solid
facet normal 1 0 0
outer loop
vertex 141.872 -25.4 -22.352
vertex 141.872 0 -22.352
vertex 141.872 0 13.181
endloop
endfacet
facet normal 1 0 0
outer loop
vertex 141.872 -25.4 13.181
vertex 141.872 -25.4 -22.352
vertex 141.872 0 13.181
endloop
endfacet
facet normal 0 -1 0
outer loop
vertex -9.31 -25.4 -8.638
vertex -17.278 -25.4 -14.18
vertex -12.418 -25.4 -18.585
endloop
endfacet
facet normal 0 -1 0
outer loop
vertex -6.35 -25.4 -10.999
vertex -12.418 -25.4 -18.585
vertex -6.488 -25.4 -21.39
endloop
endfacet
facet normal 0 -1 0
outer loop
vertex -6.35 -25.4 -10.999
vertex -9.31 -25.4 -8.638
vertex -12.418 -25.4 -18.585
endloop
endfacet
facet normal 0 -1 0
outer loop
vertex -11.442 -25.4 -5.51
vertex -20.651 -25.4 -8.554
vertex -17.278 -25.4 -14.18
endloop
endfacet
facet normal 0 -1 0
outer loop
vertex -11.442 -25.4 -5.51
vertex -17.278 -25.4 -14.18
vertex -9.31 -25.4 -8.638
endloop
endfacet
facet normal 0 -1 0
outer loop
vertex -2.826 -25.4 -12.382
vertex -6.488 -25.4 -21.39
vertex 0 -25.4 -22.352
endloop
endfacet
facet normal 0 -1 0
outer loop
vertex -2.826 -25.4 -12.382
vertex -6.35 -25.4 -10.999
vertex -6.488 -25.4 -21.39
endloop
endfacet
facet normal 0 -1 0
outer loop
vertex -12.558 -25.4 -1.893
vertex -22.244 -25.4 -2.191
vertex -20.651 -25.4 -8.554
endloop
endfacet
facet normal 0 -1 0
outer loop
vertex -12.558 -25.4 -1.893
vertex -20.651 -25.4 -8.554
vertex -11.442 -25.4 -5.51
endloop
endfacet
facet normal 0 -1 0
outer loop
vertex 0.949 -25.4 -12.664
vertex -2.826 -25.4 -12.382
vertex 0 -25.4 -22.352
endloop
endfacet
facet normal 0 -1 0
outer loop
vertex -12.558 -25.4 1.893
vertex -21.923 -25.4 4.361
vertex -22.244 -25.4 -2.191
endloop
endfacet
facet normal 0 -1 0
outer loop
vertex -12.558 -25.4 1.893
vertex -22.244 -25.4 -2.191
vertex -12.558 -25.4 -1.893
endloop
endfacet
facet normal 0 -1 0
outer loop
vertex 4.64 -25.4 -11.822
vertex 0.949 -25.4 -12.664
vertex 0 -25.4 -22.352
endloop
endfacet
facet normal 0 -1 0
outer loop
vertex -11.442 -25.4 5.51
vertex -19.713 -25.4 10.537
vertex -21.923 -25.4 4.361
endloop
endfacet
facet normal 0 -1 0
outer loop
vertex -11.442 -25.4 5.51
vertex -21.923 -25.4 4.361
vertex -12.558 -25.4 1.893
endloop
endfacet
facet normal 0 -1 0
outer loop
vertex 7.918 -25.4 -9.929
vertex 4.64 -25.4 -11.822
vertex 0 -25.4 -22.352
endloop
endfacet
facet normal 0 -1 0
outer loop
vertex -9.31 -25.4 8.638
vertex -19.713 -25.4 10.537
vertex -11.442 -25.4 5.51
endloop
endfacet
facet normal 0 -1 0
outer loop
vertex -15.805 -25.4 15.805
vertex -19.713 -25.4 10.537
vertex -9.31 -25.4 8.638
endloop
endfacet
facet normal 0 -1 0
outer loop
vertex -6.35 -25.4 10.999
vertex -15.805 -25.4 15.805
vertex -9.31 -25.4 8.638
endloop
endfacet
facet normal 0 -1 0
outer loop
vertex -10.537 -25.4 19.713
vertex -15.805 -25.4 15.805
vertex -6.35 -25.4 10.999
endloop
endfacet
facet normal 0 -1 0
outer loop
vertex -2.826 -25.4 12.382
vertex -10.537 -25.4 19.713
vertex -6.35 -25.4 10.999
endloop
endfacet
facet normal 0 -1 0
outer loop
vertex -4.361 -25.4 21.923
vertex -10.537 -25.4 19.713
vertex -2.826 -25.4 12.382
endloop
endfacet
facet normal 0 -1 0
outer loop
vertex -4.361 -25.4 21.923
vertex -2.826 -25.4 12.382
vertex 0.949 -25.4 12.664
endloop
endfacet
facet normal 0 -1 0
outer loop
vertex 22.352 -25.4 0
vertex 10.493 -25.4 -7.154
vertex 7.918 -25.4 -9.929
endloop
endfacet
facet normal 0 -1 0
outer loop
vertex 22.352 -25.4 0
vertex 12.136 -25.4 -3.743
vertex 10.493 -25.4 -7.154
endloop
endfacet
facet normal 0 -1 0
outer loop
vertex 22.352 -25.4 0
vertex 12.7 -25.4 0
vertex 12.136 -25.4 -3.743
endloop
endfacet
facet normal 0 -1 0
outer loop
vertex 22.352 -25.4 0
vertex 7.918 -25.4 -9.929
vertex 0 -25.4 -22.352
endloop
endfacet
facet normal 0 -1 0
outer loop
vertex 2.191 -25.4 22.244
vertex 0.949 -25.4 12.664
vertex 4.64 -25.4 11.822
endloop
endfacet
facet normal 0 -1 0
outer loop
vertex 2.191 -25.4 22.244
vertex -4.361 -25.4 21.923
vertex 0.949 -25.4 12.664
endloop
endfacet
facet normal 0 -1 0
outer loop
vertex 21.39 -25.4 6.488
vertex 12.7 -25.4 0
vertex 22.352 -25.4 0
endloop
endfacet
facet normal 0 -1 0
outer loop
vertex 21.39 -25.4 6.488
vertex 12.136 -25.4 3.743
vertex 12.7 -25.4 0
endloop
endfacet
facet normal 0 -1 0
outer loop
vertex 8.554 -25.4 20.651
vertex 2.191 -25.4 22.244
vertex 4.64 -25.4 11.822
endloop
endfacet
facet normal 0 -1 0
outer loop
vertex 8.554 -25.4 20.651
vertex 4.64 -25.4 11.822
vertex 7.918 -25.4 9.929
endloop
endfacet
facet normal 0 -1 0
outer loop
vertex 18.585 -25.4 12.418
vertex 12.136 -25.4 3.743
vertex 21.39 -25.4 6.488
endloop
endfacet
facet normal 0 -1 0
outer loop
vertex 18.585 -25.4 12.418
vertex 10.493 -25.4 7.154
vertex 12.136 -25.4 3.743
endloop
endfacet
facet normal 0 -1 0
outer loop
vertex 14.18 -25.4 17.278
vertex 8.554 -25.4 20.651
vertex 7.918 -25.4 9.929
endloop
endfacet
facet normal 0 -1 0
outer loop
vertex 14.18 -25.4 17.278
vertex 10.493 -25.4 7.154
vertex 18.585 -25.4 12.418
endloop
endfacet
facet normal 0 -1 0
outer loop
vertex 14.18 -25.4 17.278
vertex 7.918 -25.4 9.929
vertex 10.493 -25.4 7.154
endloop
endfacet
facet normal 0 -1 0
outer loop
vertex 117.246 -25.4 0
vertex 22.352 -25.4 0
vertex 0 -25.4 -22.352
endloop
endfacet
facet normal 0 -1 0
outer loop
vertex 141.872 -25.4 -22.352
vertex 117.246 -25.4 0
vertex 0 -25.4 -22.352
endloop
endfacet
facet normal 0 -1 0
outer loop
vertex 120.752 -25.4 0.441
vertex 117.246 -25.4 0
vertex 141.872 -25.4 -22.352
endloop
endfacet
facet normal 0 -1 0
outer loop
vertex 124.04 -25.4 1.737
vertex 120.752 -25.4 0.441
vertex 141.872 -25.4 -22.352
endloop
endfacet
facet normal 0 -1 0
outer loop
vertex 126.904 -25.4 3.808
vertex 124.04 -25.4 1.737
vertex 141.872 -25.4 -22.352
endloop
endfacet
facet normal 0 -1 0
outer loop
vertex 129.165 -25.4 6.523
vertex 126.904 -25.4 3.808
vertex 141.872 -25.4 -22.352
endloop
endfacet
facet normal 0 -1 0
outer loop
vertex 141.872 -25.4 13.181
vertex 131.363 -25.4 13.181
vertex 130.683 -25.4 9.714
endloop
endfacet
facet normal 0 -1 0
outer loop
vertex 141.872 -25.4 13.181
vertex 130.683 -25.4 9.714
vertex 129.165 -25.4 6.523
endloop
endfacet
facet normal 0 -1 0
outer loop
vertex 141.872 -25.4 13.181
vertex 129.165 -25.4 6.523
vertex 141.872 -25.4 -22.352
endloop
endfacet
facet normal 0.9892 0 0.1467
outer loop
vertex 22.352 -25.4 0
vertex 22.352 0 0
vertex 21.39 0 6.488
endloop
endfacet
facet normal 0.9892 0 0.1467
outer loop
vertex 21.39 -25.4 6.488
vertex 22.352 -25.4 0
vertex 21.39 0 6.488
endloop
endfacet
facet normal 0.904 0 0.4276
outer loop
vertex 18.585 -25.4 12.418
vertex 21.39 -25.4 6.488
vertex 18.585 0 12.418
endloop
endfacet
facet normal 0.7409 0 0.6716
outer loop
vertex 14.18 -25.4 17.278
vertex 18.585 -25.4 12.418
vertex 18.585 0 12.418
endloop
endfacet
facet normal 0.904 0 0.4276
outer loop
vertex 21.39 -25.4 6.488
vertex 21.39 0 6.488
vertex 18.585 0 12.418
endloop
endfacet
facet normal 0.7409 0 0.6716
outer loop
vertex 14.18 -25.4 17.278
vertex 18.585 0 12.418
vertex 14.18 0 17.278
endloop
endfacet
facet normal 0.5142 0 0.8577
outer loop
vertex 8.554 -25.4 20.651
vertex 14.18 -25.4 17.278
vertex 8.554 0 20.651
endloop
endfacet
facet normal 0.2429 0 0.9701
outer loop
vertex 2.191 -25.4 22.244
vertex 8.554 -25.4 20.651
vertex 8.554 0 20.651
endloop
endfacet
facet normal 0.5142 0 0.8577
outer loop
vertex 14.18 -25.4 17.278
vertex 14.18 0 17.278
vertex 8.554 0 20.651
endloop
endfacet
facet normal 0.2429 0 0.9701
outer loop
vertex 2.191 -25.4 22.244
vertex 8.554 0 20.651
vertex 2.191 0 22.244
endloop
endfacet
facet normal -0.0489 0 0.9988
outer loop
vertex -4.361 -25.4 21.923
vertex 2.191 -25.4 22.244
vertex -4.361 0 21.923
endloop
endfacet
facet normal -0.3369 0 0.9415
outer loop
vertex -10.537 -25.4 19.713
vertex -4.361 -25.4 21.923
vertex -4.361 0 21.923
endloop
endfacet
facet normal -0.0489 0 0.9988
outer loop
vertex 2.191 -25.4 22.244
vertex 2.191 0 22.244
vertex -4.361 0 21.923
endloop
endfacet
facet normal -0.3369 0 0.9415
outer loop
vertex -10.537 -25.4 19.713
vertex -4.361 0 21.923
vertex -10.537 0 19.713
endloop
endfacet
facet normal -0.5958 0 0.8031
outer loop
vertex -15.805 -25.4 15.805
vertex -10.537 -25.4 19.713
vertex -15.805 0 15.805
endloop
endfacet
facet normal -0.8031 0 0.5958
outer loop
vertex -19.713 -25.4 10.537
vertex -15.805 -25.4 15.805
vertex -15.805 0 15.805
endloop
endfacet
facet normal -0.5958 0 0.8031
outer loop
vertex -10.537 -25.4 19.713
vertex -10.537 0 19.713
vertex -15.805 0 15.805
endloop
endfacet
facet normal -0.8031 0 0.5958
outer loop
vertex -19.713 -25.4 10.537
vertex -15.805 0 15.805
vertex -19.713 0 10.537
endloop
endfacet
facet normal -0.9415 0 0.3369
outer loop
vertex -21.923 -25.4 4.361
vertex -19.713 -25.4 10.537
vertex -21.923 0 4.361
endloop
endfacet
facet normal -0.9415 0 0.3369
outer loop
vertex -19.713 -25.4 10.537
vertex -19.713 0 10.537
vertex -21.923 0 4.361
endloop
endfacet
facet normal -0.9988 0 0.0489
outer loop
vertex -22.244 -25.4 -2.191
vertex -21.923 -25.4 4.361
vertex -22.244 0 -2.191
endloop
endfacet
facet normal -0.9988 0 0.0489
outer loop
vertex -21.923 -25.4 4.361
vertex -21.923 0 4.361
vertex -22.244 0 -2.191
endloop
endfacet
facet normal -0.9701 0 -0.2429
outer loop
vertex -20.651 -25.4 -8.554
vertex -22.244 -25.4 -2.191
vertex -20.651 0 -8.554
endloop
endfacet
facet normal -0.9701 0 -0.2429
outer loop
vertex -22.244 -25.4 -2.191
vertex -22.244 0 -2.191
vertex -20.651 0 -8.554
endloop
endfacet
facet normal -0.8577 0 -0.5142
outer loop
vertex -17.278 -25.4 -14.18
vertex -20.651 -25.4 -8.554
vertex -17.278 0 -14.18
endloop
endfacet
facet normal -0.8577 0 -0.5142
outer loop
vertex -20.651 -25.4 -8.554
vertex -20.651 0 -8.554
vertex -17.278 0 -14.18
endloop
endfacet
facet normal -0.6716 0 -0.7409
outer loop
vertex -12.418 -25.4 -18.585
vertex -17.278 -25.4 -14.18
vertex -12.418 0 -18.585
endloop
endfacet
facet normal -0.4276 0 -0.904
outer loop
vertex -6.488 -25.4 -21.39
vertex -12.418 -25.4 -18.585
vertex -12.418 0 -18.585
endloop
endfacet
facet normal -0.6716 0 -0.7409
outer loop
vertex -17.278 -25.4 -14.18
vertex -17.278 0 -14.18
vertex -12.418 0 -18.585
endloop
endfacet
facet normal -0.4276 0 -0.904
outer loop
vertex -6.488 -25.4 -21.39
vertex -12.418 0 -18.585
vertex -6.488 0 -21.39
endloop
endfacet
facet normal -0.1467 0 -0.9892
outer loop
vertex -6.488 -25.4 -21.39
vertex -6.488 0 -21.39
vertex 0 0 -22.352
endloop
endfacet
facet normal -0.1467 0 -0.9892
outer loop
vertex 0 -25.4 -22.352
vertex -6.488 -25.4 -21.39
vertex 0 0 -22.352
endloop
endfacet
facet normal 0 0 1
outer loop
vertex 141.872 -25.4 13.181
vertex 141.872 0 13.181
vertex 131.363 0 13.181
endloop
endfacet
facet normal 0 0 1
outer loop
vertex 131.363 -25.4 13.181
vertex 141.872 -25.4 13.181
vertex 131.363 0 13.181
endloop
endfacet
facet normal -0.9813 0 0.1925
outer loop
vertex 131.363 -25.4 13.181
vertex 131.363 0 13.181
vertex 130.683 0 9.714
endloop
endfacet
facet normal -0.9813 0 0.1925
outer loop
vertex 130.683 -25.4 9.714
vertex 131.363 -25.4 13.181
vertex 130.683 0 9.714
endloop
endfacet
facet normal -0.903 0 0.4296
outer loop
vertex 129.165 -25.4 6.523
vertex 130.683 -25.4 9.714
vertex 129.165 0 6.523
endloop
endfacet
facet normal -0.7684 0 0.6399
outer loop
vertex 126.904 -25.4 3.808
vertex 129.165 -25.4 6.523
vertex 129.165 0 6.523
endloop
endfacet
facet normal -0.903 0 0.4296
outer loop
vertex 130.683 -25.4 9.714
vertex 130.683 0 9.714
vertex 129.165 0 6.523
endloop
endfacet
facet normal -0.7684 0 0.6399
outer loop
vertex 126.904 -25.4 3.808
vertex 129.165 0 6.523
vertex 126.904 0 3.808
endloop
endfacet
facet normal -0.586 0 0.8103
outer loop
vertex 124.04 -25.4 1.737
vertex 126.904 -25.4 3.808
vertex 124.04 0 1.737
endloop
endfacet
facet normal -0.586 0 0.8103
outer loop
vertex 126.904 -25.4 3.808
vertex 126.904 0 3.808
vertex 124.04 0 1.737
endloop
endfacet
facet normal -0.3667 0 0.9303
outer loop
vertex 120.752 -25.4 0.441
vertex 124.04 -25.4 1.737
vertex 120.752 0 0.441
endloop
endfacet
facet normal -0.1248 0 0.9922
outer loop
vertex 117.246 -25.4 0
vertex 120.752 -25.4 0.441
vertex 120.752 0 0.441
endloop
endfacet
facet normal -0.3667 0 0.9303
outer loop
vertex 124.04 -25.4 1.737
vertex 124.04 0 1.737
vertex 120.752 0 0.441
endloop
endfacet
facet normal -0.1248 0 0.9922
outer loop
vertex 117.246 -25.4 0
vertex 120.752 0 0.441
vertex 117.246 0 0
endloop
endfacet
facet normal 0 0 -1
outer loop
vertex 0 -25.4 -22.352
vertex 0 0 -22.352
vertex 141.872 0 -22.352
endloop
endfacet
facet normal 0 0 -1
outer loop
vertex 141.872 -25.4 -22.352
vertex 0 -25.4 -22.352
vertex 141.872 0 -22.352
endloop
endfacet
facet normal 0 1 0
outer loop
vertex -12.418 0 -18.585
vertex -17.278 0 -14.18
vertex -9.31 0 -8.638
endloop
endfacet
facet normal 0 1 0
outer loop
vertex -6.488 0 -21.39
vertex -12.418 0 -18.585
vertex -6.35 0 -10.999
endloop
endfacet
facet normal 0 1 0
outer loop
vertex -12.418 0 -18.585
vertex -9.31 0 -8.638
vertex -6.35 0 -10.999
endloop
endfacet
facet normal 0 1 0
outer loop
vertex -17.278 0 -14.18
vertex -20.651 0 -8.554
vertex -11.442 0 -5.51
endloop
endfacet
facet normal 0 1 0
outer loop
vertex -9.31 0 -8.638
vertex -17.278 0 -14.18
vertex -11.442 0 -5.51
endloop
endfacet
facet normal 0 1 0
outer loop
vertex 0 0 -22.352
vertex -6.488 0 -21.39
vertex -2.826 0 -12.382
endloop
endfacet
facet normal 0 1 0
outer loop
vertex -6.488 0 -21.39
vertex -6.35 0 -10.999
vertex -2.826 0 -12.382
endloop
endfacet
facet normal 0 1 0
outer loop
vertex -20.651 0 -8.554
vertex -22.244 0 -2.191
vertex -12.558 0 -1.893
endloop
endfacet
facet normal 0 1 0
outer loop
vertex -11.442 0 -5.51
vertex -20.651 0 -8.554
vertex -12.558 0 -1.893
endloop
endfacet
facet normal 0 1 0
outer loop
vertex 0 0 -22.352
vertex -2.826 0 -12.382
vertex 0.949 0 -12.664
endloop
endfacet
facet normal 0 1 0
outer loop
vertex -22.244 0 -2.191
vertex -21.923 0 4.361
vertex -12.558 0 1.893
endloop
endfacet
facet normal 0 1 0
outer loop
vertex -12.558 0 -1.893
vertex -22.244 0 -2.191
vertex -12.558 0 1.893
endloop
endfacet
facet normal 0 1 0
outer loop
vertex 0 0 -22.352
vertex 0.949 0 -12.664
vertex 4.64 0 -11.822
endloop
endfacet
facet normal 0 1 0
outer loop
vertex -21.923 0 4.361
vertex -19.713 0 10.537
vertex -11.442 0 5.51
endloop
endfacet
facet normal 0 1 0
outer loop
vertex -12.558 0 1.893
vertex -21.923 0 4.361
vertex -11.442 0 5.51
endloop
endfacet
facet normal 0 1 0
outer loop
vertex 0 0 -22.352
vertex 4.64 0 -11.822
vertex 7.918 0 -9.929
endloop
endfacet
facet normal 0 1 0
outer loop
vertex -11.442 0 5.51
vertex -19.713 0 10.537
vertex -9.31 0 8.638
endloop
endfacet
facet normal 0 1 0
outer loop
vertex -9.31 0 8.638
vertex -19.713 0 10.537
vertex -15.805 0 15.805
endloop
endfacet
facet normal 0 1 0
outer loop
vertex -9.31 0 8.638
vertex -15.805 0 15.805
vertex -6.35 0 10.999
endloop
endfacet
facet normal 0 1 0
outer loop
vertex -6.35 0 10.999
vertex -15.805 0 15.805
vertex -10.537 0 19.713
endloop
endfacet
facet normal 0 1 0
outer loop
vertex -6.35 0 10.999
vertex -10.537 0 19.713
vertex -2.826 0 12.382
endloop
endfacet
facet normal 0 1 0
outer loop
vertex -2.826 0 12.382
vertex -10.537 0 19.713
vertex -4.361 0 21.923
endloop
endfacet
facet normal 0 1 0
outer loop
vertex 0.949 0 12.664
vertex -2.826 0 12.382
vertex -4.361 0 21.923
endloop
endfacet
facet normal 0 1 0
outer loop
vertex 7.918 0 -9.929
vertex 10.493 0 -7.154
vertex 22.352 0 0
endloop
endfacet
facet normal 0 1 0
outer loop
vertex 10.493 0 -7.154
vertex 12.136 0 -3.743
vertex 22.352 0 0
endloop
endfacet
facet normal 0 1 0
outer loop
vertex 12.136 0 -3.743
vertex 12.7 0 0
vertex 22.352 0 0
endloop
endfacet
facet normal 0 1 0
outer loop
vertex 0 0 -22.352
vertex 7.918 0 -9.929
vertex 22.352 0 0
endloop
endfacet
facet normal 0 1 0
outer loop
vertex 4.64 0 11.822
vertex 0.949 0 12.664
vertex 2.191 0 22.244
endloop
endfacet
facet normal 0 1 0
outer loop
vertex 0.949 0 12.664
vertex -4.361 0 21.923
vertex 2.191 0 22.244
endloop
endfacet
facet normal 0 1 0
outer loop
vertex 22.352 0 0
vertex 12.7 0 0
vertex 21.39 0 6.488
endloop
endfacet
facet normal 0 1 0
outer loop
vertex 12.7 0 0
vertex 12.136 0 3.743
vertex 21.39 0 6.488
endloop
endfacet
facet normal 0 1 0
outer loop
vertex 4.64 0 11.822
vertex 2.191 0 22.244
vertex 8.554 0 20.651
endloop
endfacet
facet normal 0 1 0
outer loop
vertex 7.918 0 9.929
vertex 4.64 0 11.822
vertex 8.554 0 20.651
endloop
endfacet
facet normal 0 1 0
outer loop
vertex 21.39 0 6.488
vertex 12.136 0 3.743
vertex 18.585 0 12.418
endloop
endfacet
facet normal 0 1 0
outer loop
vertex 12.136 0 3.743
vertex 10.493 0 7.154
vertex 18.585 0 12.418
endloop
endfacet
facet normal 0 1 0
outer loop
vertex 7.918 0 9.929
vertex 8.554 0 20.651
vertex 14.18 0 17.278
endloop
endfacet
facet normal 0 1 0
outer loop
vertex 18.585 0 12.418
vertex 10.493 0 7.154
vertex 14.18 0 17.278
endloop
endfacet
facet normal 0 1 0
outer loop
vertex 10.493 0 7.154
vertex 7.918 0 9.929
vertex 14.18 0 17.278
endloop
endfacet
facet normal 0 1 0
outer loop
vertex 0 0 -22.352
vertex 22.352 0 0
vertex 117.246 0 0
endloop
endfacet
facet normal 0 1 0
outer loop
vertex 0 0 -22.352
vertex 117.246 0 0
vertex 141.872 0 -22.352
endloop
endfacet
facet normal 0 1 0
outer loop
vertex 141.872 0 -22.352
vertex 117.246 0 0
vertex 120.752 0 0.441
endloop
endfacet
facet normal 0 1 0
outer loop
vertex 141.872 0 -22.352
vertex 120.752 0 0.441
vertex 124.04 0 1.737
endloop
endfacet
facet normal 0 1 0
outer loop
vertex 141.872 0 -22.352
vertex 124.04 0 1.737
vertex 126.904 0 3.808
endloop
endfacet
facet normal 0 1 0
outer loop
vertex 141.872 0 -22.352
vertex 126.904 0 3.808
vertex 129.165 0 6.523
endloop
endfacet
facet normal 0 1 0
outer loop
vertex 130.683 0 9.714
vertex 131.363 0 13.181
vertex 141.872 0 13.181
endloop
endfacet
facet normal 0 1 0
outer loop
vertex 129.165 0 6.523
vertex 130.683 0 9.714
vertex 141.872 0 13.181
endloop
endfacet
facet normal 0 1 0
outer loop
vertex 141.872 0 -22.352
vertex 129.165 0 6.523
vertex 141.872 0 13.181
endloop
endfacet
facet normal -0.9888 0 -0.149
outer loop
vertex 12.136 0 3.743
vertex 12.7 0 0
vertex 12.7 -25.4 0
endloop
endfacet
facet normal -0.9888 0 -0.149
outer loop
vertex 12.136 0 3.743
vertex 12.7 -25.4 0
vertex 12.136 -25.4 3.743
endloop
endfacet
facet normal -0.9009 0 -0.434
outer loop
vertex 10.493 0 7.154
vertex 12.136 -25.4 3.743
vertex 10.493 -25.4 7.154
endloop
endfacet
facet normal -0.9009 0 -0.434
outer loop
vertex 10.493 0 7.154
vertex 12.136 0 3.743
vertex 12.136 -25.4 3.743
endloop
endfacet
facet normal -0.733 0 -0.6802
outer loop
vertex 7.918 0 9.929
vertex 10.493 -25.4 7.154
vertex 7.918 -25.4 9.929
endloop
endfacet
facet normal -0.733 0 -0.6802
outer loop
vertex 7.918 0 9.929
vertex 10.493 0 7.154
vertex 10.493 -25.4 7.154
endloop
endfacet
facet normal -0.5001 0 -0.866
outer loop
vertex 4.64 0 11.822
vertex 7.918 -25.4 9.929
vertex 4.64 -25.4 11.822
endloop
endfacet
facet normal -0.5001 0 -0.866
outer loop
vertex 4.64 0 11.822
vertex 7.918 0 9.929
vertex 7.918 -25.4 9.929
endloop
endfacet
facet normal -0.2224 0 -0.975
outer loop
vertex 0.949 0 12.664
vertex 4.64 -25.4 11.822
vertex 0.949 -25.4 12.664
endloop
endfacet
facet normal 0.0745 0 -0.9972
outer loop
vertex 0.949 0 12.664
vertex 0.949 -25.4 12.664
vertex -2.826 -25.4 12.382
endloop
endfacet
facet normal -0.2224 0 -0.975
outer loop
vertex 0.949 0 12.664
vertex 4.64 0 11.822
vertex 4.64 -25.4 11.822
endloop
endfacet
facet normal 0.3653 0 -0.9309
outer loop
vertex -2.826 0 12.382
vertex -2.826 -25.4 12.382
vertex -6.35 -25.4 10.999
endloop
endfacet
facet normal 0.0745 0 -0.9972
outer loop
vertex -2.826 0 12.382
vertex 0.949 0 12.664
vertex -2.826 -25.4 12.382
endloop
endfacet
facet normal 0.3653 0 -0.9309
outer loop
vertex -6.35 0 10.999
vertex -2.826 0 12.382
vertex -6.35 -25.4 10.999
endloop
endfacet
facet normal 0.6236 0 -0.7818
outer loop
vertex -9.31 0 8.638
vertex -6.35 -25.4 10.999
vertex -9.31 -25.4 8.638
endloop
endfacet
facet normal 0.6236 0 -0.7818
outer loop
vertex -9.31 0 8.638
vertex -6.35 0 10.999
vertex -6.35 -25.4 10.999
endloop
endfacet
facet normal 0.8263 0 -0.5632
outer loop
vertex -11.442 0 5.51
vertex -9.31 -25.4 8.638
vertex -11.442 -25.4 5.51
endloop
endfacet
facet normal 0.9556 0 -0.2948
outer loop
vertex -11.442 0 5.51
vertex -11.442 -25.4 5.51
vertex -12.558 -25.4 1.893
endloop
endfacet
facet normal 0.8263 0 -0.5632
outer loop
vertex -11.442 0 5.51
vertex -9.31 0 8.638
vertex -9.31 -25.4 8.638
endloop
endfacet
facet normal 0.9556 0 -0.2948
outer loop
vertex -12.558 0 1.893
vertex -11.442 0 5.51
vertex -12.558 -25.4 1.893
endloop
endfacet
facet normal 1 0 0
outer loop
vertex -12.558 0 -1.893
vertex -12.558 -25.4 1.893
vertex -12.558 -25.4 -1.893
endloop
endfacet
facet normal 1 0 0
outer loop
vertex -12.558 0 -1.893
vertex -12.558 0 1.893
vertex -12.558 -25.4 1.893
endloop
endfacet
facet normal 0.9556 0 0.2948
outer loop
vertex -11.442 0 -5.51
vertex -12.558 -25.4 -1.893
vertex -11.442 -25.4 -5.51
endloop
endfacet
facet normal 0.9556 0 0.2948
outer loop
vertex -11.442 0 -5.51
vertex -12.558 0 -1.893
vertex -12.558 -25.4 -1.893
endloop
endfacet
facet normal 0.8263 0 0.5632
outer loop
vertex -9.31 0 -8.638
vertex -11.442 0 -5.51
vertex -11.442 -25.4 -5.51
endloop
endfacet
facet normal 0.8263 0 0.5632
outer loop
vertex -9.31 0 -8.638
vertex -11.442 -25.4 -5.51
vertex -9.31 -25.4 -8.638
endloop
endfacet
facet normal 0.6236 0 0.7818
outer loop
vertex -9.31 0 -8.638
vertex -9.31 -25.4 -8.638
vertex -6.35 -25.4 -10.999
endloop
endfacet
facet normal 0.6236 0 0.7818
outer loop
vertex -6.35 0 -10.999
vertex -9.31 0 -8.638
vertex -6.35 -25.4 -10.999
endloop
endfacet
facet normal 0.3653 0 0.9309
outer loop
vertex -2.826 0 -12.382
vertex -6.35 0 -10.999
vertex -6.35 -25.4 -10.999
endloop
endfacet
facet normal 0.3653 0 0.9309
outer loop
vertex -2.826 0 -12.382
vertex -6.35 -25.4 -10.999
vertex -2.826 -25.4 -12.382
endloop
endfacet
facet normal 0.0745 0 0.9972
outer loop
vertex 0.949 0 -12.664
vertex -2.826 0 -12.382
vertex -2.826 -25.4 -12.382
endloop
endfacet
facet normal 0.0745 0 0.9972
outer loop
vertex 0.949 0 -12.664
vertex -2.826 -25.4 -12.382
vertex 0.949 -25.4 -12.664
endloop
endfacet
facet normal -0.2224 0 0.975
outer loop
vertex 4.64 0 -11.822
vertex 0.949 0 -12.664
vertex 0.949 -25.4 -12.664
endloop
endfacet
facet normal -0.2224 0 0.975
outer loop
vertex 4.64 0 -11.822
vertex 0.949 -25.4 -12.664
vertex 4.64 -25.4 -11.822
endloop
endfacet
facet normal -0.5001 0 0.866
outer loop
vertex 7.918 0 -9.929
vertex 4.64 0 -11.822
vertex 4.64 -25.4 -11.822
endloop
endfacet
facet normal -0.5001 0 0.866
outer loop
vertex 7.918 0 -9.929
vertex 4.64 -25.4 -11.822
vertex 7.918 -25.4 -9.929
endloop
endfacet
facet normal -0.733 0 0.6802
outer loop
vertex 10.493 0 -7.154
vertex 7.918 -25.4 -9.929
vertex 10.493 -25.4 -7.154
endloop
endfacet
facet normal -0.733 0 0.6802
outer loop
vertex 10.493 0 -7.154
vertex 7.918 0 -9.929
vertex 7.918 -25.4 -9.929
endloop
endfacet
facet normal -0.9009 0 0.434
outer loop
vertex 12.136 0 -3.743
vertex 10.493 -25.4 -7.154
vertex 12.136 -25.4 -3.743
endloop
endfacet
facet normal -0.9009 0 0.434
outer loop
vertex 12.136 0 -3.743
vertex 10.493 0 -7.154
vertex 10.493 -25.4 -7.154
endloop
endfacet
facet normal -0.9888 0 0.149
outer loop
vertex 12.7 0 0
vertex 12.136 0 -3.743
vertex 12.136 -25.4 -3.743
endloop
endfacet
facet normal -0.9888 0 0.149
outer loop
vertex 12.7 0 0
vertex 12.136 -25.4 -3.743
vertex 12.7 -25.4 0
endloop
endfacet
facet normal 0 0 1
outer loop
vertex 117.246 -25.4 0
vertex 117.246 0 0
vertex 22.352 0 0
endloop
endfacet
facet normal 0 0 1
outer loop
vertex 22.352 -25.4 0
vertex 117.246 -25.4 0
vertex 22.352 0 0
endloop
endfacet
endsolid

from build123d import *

# Parameters (mm, degrees)
F0_R     = 12.7
F1_DEPTH = 25.4


with BuildPart() as f1:
    # F0 (on Front) → F1 (new body)
    with BuildSketch(Plane.XZ):
        Circle(F0_R)
        with BuildLine():
            ThreePointArc((0, -22.352), (15.805251, -15.805251), (22.352, 0))
            ThreePointArc((22.352, 0), (-15.805251, 15.805251), (0, -22.352))
        make_face()
        Circle(F0_R, mode=Mode.SUBTRACT)
        with BuildLine():
            Line((117.2464, 0), (22.352, 0))
            ThreePointArc((22.352, 0), (15.805251, -15.805251), (0, -22.352))
            Line((0, -22.352), (141.871706, -22.352))
            Line((141.871706, -22.352), (141.871706, 13.181371))
            Line((141.871706, 13.181371), (131.363466, 13.181371))
            ThreePointArc((131.363466, 13.181371), (126.903523, 3.807631), (117.2464, 0))
        make_face()
    extrude(amount=F1_DEPTH)


solid = f1.part
